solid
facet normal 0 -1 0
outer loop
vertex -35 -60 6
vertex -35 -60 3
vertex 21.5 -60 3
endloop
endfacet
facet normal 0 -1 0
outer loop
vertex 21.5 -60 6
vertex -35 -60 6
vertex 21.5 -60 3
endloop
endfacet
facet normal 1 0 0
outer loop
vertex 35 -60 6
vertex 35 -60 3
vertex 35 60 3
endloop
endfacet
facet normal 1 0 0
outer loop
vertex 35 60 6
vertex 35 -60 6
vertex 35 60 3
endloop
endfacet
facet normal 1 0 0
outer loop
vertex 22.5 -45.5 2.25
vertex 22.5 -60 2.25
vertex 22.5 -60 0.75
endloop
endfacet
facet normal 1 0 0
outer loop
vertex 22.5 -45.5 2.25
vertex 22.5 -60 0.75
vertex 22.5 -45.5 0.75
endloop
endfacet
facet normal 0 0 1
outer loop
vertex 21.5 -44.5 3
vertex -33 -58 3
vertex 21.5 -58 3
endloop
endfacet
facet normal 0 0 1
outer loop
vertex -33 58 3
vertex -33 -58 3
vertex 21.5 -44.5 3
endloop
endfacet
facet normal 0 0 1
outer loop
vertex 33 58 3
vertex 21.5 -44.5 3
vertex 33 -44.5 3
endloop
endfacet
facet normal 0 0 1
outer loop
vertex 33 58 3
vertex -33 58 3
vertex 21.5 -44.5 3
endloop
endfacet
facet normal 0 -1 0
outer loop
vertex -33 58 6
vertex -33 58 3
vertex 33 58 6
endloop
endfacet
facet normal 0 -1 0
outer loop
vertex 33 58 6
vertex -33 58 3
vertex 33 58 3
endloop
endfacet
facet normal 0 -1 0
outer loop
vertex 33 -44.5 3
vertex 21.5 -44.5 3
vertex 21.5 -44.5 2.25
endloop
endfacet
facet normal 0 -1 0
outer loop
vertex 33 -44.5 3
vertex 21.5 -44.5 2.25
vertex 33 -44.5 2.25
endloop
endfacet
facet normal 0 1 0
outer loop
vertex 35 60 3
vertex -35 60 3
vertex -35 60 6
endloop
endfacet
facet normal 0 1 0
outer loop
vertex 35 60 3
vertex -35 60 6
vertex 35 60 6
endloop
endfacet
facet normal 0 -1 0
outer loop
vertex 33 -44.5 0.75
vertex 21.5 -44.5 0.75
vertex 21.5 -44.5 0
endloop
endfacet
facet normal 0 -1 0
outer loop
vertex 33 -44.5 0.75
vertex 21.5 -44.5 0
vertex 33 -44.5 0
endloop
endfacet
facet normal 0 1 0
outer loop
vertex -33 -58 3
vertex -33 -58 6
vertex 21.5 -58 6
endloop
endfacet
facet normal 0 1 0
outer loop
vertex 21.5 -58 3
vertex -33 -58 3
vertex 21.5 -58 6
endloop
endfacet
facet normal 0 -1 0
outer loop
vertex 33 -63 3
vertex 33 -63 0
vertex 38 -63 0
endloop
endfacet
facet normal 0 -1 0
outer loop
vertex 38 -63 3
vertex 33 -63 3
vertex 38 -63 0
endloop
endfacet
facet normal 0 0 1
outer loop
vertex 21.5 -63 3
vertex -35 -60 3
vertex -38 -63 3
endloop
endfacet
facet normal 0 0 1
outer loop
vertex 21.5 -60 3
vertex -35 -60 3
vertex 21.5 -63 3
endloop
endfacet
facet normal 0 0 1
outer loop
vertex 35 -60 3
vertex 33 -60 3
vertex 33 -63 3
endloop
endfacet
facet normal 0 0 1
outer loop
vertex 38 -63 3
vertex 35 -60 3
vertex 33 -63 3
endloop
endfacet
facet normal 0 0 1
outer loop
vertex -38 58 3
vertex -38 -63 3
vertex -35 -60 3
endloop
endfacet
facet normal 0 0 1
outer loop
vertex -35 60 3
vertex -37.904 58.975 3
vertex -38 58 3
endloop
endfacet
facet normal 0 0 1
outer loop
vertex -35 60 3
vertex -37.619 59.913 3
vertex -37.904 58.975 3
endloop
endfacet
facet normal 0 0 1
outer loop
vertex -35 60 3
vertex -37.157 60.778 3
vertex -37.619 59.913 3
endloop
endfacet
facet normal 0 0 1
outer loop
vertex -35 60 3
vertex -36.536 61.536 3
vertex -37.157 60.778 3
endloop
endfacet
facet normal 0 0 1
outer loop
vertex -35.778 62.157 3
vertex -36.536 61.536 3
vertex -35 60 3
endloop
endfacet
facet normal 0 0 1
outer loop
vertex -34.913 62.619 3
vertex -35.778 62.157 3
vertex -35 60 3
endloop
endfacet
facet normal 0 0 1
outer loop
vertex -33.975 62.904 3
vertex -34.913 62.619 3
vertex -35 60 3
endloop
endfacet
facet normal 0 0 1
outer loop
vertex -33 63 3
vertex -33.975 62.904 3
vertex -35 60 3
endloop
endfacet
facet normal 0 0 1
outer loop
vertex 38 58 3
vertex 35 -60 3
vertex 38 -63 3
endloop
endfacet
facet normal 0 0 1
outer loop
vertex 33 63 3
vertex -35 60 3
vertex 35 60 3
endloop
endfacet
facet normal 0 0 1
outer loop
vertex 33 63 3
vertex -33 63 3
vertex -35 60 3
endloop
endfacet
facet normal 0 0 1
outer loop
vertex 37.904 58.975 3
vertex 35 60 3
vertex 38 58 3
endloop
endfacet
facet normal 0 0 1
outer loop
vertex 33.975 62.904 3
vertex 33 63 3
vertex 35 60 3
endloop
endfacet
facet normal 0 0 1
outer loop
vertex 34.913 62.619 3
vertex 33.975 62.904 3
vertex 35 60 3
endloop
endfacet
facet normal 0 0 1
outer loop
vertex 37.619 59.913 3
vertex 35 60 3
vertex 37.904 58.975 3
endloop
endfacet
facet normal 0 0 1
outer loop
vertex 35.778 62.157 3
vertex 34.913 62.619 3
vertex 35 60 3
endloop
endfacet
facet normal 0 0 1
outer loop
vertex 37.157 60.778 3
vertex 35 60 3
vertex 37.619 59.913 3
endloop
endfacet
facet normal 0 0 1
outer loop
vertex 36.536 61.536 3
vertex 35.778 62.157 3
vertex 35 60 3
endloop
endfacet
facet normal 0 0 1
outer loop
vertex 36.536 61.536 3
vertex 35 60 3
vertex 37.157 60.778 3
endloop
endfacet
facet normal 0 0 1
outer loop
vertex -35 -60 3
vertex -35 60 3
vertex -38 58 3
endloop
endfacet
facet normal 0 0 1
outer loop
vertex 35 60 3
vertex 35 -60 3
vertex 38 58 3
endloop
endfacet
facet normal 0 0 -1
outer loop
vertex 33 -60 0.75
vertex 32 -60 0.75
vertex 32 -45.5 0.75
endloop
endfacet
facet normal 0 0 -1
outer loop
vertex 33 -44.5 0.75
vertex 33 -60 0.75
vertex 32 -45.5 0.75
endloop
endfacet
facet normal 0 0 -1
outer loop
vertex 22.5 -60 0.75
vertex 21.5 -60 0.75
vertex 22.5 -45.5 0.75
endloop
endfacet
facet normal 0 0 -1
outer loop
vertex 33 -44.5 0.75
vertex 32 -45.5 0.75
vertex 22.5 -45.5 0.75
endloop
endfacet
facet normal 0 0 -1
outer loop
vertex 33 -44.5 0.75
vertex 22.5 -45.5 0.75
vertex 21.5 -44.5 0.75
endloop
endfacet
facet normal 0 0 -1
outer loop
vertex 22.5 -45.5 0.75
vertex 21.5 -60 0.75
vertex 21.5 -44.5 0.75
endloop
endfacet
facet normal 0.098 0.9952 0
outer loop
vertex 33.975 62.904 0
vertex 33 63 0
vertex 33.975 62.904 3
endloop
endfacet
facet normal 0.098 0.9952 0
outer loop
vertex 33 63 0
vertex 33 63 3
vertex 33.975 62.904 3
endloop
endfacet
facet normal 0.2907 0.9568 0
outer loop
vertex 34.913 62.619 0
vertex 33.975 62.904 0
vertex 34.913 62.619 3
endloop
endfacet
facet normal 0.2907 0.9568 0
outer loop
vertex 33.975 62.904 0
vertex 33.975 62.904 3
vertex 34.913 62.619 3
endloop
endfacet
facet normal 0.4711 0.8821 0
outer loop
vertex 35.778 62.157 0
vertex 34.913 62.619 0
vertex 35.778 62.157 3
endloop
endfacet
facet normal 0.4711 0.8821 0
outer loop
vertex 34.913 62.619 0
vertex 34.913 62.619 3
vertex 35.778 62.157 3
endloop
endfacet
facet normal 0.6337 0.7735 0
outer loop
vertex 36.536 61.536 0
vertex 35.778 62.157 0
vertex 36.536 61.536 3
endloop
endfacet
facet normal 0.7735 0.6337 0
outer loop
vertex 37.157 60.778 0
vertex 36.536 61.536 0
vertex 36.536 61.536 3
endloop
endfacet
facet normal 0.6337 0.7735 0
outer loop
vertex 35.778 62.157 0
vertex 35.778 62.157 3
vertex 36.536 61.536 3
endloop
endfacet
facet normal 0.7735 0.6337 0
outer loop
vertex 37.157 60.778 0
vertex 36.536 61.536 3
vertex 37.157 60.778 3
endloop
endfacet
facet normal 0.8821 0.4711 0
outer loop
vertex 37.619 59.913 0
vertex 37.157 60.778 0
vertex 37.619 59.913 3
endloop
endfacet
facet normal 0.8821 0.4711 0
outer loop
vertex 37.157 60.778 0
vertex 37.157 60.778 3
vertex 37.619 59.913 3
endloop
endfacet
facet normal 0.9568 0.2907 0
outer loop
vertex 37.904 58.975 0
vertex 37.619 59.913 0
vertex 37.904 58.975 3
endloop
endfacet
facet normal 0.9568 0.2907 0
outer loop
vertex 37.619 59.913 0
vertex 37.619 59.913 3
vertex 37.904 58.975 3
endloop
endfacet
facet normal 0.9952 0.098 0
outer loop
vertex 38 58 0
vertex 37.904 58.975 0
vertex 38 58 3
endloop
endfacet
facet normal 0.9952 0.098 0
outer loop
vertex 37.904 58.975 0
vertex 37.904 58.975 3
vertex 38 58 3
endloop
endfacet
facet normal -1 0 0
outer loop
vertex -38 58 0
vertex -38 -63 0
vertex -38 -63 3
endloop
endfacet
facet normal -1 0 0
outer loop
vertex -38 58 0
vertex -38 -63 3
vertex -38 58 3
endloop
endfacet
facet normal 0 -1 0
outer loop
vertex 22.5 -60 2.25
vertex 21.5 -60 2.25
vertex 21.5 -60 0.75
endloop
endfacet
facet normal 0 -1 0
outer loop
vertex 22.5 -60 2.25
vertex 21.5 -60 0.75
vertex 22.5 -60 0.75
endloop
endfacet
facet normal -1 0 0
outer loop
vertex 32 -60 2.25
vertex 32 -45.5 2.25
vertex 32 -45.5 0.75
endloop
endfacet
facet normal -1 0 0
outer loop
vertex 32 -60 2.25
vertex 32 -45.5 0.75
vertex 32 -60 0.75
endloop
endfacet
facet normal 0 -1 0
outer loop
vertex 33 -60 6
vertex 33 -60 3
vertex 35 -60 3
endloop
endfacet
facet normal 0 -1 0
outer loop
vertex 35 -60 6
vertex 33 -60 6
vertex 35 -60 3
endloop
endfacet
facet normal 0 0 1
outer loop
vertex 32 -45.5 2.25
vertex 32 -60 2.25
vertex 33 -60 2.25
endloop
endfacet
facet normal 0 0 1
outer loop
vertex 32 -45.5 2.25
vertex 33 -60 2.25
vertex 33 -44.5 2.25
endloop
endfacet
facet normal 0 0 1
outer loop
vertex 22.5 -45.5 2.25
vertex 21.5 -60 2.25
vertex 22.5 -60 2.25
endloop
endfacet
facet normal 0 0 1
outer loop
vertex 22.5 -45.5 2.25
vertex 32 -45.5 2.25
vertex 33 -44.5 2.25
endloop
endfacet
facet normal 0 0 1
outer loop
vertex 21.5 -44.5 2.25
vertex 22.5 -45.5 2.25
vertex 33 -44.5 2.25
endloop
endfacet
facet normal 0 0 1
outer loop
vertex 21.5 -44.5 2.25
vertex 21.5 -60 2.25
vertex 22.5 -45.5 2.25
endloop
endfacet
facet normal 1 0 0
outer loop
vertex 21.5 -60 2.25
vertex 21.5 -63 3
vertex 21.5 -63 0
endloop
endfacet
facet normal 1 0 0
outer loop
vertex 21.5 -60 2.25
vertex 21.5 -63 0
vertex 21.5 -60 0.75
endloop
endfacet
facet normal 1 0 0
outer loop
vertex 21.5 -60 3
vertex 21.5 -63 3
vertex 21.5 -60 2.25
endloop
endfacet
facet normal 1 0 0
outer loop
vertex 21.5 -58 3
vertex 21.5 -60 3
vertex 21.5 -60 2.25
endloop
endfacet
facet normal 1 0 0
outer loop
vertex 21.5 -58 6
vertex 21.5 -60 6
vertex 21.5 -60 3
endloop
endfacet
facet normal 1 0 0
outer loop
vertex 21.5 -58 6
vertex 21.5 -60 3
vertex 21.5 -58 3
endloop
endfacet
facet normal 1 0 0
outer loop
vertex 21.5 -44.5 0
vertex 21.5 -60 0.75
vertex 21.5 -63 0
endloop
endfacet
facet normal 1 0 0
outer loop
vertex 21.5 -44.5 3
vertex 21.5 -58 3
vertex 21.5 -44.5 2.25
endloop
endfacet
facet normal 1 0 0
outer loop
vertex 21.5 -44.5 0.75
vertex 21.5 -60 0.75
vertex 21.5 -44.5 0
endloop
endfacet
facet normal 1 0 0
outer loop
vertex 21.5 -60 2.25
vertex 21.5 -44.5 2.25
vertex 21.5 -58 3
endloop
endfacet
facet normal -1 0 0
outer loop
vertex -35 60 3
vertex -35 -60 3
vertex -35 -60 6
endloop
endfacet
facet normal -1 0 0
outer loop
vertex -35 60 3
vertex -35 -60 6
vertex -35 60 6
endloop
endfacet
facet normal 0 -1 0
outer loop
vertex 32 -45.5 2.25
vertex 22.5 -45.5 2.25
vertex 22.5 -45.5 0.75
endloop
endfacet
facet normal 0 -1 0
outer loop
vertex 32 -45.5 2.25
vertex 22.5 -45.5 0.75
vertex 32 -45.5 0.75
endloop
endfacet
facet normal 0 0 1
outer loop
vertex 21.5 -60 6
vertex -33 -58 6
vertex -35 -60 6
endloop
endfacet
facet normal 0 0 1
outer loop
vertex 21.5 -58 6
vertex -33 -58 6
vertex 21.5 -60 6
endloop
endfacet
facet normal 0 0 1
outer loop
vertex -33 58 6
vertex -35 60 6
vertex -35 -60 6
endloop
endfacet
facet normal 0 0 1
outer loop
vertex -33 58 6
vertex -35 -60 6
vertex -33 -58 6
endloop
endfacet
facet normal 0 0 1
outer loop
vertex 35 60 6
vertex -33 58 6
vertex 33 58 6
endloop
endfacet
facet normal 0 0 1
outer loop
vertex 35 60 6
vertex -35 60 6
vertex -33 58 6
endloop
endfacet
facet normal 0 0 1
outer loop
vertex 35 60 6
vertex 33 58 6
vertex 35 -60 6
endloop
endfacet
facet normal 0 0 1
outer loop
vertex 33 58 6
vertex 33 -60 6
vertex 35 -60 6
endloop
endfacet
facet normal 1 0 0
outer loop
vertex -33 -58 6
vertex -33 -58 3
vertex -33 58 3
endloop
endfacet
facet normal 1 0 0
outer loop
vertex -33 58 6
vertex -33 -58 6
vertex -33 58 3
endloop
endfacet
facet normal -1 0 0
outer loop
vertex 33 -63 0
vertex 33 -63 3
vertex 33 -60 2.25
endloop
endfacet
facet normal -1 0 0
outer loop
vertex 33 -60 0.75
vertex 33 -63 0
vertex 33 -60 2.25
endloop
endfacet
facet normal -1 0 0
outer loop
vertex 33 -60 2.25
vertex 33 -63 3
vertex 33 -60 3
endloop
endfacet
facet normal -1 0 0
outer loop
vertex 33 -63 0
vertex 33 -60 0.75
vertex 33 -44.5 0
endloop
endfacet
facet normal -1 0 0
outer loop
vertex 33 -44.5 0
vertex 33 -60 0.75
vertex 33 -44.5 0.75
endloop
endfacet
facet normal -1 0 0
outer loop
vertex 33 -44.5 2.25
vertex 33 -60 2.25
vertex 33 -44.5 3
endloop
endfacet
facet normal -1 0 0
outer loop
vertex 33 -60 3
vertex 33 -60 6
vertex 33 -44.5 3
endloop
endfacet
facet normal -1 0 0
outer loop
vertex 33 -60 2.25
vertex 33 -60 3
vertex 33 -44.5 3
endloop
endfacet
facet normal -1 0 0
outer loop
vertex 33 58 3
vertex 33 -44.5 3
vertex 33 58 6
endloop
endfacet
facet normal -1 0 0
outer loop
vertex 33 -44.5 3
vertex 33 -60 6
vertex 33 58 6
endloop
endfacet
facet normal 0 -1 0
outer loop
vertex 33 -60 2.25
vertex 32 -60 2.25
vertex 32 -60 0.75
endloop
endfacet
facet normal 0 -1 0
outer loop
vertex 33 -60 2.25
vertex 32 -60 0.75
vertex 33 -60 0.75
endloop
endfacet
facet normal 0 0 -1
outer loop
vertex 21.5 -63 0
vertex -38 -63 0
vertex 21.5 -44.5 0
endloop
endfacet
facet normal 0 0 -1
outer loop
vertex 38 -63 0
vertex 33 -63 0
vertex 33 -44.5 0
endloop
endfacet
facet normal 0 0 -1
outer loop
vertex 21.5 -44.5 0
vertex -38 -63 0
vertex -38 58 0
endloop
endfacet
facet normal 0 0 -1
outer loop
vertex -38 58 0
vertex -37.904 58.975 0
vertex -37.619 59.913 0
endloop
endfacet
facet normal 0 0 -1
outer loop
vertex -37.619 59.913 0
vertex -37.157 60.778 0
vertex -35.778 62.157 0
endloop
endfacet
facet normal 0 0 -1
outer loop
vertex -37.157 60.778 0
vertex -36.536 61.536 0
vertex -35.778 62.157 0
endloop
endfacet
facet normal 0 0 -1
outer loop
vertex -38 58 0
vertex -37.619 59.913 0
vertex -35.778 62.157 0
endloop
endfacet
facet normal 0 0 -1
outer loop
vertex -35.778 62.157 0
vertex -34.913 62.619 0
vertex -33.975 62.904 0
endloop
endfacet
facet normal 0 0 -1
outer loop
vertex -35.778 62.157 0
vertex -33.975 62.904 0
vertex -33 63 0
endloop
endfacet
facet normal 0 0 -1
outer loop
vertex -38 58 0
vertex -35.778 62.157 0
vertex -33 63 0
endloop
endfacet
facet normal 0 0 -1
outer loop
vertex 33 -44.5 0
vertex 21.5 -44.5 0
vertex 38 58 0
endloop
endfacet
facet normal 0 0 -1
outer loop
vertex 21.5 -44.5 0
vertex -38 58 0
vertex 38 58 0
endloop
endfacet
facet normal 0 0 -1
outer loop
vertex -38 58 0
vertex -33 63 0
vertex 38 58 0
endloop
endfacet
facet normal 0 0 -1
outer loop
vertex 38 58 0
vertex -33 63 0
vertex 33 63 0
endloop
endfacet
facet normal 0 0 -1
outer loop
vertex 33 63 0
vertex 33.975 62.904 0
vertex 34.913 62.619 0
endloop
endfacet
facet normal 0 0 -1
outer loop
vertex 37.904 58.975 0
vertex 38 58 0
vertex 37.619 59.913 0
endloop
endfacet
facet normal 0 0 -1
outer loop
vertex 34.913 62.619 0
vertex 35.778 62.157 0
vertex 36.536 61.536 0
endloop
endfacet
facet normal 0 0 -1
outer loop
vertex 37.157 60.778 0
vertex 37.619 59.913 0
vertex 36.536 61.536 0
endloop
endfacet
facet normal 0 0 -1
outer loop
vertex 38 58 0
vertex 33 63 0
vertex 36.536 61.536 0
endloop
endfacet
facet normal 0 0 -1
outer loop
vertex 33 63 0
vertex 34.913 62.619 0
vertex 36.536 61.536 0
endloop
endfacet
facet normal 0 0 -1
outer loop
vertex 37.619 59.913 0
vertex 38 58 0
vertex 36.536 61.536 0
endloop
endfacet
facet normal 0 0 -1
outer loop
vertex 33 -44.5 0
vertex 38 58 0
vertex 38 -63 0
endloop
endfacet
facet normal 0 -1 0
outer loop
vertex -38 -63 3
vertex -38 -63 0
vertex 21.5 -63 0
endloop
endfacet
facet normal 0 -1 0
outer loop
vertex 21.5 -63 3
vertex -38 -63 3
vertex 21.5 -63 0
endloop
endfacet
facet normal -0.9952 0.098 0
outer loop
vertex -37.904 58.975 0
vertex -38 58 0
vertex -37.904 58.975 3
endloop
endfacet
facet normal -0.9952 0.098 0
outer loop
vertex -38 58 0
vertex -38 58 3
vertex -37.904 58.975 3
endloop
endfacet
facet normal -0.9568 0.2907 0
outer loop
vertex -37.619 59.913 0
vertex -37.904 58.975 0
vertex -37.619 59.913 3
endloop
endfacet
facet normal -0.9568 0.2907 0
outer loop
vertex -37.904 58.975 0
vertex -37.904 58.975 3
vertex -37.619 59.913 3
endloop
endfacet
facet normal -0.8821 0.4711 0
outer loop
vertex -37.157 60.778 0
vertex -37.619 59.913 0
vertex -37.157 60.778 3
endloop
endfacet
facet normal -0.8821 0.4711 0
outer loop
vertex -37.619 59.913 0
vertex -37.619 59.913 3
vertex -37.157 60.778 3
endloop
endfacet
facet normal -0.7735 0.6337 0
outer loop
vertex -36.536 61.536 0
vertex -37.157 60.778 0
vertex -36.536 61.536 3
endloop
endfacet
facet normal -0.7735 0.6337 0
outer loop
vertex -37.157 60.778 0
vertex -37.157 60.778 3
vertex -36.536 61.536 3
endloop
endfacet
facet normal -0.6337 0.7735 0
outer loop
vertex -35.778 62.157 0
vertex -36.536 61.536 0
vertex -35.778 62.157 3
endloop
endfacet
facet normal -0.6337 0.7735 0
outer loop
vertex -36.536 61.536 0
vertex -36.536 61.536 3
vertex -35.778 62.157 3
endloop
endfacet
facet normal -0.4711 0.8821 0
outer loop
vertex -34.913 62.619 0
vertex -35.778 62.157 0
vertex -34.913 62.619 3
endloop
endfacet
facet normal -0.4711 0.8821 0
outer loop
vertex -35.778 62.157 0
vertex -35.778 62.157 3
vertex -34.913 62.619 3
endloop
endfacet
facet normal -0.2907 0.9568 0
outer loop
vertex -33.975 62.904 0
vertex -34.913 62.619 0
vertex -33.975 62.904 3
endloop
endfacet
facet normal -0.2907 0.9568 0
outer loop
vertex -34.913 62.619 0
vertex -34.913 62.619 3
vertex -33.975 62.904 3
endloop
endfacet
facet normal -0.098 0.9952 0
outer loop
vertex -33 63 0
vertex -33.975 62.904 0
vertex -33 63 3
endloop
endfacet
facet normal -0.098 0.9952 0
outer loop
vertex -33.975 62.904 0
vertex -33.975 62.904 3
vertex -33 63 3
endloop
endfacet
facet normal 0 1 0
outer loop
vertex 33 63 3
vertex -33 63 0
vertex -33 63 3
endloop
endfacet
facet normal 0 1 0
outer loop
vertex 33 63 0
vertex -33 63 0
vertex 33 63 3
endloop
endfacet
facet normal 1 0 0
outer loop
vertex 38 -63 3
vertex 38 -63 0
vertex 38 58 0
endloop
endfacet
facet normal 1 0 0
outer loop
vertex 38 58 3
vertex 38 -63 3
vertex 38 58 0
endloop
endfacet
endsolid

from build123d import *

# Parameters (mm, degrees)
F0_W      = 70
F0_H      = 120
F0_W_2    = 66
F0_H_2    = 116
F1_DEPTH  = 6
F0_W_3    = 76
F0_H_3    = 126
F2_DEPTH  = 3
F3_R      = 5
F4_W      = 11.5
F4_H      = 13.5
F5_DEPTH  = 25
F8_W      = 13.5
F8_H      = 1.5
F9_DEPTH  = 1
F6_W      = 11.5
F6_H      = 1.5
F10_DEPTH = 1
F7_W      = 13.5
F7_H      = 1.5
F11_DEPTH = 1
F13_DEPTH = 25
F14_W     = 1
F14_H     = 1.5
F15_W     = 1
F15_H     = 1.5
F16_DEPTH = 3


with BuildPart() as f1:
    # F0 (on Top) → F1 (new body)
    with BuildSketch(Plane.XY):
        Rectangle(F0_W, F0_H)
        Rectangle(F0_W_2, F0_H_2, mode=Mode.SUBTRACT)
    extrude(amount=F1_DEPTH)

    # F0 (on Top) → F2 (join)
    with BuildSketch(Plane.XY):
        Rectangle(F0_W_3, F0_H_3)
        Rectangle(F0_W, F0_H, mode=Mode.SUBTRACT)
        Rectangle(F0_W_2, F0_H_2)
    extrude(amount=F2_DEPTH)

    # F3
    f3_edges = [f1.edges().sort_by_distance(p)[0] for p in [
        (-38, 63, 1.5),
        (38, 63, 1.5),
    ]]
    fillet(f3_edges, radius=F3_R)

    # F4 (on face) → F5 (cut)
    with BuildSketch(Plane.XY.offset(3)):
        with Locations((27.25, -51.25)):
            Rectangle(F4_W, F4_H)
    extrude(amount=-F5_DEPTH, mode=Mode.SUBTRACT)

    # F8 (on face) → F9 (join)
    with BuildSketch(Plane(origin=(33, 0, 0), x_dir=(0, -1, 0), z_dir=(-1, 0, 0))):
        with Locations((51.25, 1.5)):
            Rectangle(F8_W, F8_H)
    extrude(amount=F9_DEPTH)

    # F6 (on face) → F10 (join)
    with BuildSketch(Plane.XZ.offset(44.5)):
        with Locations((27.25, 1.5)):
            Rectangle(F6_W, F6_H)
    extrude(amount=F10_DEPTH)

    # F7 (on face) → F11 (join)
    with BuildSketch(Plane.YZ.offset(21.5)):
        with Locations((-51.25, 1.5)):
            Rectangle(F7_W, F7_H)
    extrude(amount=F11_DEPTH)

    # F12 (on face) → F13 (cut)
    with BuildSketch(Plane(origin=(0, -58, 0), x_dir=(-1, 0, 0), z_dir=(0, 1, 0))):
        Polygon((-21.5, 2.25), (-21.5, 3), (-21.5, 6), (-33, 6), (-33, 2.25), (-32, 2.25), (-32, 0.75), (-33, 0.75), (-33, 0), (-21.5, 0), (-21.5, 0.75), (-22.5, 0.75), (-22.5, 2.25), align=None)
    extrude(amount=-F13_DEPTH, mode=Mode.SUBTRACT)

    # F14 (on face) + F15 (on face) → F16 (cut)
    with BuildSketch(Plane.XZ.offset(63)):
        with Locations((22, 1.5)):
            Rectangle(F14_W, F14_H)
    with BuildSketch(Plane.XZ.offset(63)):
        with Locations((32.5, 1.5)):
            Rectangle(F15_W, F15_H)
    extrude(amount=-F16_DEPTH, mode=Mode.SUBTRACT)


solid = f1.part
